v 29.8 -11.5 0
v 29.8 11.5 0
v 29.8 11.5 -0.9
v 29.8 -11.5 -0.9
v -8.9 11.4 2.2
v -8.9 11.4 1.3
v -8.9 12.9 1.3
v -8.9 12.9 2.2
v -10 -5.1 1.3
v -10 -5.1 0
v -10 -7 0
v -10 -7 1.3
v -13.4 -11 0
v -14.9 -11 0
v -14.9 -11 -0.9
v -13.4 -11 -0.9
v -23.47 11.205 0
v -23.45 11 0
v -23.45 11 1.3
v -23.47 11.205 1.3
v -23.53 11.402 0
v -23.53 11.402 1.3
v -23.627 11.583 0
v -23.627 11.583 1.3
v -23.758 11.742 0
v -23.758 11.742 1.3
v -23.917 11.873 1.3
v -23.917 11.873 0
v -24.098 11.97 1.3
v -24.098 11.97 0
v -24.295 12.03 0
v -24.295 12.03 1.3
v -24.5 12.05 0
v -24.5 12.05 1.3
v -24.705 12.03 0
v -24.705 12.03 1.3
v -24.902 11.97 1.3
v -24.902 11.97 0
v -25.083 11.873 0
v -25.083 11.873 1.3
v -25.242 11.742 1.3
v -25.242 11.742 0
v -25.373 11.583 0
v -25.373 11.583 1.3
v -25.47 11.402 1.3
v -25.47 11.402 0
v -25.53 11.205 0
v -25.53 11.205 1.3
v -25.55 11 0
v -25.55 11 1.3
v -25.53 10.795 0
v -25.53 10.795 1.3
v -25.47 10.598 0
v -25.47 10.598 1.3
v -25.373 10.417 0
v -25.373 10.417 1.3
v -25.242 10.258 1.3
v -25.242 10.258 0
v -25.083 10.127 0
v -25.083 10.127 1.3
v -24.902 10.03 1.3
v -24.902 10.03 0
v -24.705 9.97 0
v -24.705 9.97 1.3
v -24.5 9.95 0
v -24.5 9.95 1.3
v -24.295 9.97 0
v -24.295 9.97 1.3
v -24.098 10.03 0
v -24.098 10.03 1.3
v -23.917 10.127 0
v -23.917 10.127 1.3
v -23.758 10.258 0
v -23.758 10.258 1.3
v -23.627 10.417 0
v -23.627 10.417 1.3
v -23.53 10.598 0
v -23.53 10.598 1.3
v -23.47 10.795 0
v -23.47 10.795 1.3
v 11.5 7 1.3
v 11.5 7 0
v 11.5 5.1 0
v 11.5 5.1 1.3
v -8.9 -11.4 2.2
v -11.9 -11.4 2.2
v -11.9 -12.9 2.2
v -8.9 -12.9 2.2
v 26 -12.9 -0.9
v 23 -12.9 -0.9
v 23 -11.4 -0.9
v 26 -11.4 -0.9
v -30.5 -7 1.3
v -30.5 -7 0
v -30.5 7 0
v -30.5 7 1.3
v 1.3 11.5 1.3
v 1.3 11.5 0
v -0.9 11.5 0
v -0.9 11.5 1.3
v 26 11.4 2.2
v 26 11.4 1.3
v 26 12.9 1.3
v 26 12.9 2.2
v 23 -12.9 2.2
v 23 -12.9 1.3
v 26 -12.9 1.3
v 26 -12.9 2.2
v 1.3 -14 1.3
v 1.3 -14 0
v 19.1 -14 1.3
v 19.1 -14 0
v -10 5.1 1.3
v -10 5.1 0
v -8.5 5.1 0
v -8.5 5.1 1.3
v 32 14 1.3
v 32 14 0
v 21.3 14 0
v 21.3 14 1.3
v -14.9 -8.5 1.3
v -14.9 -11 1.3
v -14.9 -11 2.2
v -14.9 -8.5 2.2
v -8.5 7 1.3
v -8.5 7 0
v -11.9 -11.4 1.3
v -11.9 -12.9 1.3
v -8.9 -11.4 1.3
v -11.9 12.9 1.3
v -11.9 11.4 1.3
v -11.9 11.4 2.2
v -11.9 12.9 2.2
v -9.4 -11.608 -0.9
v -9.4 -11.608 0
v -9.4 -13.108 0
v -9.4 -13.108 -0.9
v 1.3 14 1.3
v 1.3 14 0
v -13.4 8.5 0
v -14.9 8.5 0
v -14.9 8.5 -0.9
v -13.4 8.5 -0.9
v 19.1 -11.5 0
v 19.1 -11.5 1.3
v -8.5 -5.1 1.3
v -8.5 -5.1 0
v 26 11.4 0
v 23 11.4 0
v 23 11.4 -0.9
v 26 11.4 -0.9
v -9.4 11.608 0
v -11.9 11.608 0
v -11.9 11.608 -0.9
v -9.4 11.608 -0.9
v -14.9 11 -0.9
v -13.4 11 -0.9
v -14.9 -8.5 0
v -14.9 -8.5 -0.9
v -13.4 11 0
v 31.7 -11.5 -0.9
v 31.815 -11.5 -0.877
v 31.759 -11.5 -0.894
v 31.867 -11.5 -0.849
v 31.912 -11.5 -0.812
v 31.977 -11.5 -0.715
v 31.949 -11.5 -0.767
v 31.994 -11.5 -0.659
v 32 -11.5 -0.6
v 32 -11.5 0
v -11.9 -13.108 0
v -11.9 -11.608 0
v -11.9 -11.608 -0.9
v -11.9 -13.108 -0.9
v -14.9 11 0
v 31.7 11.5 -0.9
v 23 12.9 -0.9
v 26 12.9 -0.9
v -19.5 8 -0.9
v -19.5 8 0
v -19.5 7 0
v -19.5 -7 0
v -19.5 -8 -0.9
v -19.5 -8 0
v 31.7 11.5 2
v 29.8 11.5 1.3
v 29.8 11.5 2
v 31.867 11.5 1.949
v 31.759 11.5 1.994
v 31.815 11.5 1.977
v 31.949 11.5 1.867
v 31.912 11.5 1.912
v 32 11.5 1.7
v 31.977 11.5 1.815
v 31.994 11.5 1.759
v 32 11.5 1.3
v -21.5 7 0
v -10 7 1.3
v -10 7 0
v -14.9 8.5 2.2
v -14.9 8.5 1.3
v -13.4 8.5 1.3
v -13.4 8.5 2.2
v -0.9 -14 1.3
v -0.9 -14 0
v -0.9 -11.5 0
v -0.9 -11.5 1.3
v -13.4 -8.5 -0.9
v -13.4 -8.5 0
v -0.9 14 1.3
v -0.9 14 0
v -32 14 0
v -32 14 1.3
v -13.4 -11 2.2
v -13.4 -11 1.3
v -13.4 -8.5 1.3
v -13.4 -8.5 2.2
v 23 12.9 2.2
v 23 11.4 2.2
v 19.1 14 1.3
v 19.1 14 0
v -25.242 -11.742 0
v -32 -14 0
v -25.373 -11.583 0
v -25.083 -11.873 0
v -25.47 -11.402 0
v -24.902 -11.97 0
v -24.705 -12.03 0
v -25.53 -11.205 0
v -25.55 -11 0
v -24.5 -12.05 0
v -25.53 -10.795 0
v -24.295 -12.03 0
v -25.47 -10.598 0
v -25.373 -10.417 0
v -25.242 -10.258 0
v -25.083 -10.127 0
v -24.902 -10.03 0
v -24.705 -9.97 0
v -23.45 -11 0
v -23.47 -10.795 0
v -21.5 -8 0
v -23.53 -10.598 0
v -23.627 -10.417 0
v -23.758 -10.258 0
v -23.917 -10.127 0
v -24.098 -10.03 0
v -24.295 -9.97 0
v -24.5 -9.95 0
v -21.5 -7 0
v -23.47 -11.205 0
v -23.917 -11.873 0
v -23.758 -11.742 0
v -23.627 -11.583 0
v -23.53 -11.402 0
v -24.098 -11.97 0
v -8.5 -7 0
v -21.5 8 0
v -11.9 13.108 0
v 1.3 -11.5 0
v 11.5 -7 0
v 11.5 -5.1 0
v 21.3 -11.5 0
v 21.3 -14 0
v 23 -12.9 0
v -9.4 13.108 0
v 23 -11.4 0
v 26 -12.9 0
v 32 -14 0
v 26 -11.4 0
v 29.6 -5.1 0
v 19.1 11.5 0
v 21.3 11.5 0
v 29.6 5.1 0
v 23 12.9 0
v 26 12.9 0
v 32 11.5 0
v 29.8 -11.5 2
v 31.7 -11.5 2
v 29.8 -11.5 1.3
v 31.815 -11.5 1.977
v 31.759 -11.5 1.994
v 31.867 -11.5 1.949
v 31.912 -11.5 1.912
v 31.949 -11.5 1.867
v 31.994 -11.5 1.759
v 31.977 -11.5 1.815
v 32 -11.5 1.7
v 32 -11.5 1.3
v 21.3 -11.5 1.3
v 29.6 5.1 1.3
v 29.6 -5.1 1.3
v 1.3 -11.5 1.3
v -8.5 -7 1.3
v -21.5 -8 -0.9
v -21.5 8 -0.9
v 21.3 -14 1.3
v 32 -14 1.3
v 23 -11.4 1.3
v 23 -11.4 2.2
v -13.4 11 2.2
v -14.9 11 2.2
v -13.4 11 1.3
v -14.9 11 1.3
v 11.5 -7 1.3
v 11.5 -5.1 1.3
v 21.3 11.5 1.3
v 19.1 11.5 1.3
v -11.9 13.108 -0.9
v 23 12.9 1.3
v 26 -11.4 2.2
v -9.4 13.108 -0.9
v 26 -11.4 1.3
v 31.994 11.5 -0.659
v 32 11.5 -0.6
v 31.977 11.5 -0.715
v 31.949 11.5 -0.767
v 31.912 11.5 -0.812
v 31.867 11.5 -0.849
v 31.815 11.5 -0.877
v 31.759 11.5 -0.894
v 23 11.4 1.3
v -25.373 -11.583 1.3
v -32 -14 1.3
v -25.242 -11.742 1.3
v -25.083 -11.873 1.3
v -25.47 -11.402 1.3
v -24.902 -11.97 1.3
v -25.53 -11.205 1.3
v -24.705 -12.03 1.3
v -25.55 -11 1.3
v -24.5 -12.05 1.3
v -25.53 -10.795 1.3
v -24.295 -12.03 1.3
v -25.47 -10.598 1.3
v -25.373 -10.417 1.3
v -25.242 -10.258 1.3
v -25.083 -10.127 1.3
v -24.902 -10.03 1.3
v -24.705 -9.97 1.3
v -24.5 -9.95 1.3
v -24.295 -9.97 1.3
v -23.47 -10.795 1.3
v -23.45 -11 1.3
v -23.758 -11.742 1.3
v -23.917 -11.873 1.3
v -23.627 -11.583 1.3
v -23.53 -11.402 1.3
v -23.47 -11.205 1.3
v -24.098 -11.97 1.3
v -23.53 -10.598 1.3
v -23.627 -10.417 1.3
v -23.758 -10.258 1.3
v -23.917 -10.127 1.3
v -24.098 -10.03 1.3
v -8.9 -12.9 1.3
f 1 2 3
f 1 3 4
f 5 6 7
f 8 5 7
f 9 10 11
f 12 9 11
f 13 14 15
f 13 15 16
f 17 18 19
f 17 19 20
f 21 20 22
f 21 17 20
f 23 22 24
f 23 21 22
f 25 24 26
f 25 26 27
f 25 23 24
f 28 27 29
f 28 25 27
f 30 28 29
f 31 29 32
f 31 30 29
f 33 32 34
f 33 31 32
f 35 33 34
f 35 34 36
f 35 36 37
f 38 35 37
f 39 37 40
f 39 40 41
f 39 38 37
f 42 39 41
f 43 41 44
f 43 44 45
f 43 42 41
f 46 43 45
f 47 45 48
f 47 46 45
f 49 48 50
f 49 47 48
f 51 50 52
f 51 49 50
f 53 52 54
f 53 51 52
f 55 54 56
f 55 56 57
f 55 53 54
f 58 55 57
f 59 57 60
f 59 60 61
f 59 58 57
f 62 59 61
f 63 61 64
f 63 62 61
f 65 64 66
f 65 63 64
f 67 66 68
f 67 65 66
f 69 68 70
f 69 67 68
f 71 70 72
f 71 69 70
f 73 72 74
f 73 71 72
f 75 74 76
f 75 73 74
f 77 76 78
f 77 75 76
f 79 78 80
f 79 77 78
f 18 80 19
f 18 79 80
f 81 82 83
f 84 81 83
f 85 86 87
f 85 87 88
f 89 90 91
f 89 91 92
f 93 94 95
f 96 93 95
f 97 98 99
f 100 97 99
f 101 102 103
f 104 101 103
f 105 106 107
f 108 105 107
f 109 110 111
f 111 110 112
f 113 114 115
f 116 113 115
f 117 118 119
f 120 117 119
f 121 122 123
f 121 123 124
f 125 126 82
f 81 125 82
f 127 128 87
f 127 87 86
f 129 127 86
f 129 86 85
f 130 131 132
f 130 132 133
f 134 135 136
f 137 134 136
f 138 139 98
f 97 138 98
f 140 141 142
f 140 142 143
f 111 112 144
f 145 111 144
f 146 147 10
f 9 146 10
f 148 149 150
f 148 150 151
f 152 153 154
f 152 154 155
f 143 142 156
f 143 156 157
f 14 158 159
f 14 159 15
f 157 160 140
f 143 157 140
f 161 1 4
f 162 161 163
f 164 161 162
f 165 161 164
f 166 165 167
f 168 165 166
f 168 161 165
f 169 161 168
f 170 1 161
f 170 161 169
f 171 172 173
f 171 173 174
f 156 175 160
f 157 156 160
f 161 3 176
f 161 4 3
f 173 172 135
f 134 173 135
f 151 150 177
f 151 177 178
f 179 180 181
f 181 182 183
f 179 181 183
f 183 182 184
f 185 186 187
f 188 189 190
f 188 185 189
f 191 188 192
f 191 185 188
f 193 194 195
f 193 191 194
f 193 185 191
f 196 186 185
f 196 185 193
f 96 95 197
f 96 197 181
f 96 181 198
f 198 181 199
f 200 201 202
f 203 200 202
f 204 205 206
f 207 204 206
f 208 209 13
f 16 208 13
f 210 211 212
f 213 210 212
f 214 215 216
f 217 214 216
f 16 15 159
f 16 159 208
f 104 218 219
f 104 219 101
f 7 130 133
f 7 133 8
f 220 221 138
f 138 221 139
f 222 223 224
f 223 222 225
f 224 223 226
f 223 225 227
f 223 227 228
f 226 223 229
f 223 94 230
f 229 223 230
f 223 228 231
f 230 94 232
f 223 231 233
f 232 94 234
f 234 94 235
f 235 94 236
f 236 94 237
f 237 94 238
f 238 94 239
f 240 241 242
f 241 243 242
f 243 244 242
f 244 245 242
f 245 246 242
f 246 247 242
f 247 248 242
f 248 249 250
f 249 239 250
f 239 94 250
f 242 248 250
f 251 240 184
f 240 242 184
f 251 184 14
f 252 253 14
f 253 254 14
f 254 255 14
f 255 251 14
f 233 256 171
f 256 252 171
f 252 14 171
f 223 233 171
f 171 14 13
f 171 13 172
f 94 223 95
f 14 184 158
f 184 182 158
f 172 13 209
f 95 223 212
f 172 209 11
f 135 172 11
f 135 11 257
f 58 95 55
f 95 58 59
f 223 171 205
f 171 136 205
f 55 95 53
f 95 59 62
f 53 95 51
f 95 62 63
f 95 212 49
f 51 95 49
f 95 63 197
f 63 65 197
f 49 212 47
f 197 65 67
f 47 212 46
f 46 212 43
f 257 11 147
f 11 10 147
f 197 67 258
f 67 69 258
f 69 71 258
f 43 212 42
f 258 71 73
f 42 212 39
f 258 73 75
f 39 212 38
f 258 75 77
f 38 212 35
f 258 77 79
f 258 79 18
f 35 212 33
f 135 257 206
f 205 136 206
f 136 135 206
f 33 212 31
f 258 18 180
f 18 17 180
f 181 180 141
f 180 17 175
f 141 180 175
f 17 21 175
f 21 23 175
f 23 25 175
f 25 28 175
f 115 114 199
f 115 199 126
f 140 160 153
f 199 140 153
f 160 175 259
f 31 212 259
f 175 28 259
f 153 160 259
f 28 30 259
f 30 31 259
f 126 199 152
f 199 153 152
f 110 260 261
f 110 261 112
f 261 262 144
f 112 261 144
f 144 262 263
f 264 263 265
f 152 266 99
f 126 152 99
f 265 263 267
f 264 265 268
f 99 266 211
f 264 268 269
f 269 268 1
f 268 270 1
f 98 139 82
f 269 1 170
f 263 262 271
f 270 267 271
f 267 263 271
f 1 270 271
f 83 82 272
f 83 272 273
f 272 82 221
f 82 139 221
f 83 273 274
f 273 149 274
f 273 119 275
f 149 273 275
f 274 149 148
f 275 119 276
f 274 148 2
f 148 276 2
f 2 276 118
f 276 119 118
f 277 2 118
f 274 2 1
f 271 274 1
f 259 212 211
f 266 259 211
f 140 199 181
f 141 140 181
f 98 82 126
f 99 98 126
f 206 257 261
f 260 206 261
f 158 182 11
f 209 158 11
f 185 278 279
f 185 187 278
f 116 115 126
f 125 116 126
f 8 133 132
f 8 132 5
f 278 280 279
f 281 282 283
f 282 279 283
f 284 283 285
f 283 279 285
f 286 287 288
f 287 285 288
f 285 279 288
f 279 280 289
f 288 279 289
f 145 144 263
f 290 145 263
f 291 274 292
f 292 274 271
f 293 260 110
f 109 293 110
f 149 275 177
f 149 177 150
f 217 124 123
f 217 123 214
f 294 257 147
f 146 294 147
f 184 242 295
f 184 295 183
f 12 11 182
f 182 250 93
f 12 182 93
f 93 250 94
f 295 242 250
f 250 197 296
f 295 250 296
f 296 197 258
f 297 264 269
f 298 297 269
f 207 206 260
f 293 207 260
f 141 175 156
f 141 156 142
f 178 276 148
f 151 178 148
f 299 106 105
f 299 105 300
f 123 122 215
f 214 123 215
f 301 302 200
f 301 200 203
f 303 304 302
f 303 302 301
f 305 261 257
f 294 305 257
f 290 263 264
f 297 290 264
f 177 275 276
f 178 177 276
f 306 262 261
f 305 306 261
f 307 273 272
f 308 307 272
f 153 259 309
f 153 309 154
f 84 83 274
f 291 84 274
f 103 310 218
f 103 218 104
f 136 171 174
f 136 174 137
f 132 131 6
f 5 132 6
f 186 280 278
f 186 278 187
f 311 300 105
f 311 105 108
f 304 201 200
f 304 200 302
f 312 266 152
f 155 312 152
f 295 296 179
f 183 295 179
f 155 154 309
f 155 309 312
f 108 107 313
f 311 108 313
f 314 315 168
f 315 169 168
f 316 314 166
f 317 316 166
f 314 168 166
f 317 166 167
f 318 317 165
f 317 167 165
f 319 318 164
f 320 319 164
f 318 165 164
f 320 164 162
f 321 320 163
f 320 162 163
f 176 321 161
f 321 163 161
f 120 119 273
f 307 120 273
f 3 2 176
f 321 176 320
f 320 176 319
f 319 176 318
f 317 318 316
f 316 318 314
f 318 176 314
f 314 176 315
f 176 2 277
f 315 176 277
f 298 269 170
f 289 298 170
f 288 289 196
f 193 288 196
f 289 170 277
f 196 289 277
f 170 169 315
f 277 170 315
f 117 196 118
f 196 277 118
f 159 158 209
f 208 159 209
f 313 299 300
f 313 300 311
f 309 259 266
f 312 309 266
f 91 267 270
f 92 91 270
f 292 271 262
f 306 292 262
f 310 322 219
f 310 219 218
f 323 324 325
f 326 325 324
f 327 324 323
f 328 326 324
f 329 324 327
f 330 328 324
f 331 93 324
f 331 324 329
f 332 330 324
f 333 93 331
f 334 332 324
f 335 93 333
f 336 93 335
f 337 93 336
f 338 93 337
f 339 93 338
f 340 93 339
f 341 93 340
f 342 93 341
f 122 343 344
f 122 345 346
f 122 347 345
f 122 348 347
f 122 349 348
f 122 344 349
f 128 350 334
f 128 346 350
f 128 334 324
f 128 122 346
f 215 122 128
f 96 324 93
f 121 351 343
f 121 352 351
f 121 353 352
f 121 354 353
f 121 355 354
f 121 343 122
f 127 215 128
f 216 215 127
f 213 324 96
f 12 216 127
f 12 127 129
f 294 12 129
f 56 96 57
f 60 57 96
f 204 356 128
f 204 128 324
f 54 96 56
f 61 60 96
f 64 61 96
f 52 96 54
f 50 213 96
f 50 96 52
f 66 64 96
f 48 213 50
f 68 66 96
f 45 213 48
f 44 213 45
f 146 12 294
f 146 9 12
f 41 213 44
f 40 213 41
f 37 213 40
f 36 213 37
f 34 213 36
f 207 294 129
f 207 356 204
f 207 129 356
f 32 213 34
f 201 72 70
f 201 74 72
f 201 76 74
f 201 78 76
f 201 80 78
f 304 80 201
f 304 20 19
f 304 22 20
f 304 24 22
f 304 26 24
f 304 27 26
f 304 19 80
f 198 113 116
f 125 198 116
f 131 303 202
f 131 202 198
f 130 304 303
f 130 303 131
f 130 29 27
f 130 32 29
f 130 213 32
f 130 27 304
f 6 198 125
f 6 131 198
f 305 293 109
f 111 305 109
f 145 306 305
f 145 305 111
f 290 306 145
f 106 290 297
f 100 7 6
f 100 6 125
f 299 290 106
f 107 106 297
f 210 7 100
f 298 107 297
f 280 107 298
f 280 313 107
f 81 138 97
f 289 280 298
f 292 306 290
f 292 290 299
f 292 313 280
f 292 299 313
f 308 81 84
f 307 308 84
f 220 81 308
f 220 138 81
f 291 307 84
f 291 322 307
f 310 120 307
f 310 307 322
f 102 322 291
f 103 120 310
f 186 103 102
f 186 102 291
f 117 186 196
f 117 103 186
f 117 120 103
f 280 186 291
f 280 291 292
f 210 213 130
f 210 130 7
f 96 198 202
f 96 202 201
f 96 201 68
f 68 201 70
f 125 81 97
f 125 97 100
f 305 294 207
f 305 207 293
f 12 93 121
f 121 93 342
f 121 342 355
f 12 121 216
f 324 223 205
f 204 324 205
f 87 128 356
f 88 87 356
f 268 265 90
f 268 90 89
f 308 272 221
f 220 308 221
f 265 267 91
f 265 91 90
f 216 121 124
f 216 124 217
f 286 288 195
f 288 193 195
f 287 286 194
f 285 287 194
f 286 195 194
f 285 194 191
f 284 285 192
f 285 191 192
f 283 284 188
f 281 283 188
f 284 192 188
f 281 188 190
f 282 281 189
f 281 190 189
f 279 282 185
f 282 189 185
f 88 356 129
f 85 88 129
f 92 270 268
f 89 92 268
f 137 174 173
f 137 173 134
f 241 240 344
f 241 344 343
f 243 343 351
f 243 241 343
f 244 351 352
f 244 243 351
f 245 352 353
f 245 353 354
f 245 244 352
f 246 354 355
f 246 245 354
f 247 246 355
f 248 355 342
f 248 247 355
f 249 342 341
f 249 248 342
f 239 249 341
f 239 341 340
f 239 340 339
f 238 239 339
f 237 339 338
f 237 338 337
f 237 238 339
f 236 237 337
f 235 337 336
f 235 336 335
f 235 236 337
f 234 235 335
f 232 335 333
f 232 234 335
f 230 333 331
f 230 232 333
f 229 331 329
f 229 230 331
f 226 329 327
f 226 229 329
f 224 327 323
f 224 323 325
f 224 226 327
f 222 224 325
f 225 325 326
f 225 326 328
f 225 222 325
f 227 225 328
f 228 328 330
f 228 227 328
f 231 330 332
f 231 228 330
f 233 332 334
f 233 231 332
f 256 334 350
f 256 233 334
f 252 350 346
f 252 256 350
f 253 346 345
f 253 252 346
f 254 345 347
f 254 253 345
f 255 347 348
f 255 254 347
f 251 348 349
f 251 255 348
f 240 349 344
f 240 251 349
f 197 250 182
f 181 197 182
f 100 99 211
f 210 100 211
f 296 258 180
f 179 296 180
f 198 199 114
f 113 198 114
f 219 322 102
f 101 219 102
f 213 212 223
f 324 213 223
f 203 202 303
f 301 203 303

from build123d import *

# Parameters (mm, degrees)
F0_R      = 1.05
F1_DEPTH  = 1.3
F3_W      = 2.2
F3_H      = 23
F4_DEPTH  = 0.7
F5_W      = 2.5
F5_H      = 1.5
F5_W_2    = 1.5
F5_H_2    = 2.5
F5_W_3    = 3
F5_W_4    = 2.2
F5_H_3    = 23
F6_DEPTH  = 0.9
F7_R      = 0.3
F8_R      = 0.3
F9_W      = 2
F9_H      = 1
F9_H_2    = 14
F10_DEPTH = 0.9
F3_W_2    = 3
F3_H_2    = 1.5
F3_W_3    = 1.5
F3_H_3    = 2.5
F11_DEPTH = 0.9


with BuildPart() as f1:
    # F0 (on Top) → F1 (new body)
    with BuildSketch(Plane.XY):
        Polygon((21.3, -14), (32, -14), (32, 14), (21.3, 14), (21.3, 11.5), (19.1, 11.5), (19.1, 14), (1.3, 14), (1.3, 11.5), (-0.9, 11.5), (-0.9, 14), (-32, 14), (-32, -14), (-0.9, -14), (-0.9, -11.5), (1.3, -11.5), (1.3, -14), (19.1, -14), (19.1, -11.5), (21.3, -11.5), align=None)
        with Locations((-24.5, -11)):
            Circle(F0_R, mode=Mode.SUBTRACT)
        Polygon((-10, 7), (-10, 5.1), (-8.5, 5.1), (-8.5, 7), (11.5, 7), (11.5, 5.1), (29.6, 5.1), (29.6, -5.1), (11.5, -5.1), (11.5, -7), (-8.5, -7), (-8.5, -5.1), (-10, -5.1), (-10, -7), (-30.5, -7), (-30.5, -5.1), (-30.5, 5.1), (-30.5, 7), align=None, mode=Mode.SUBTRACT)
        with Locations((-24.5, 11)):
            Circle(F0_R, mode=Mode.SUBTRACT)
    extrude(amount=F1_DEPTH)

    # F3 (on face) → F4 (join)
    with BuildSketch(Plane.XY.offset(1.3)):
        with Locations((30.9, 0)):
            Rectangle(F3_W, F3_H)
    extrude(amount=F4_DEPTH)

    # F5 (on face) → F6 (join)
    with BuildSketch(Plane(origin=(0, 0, 0), x_dir=(1, 0, 0), z_dir=(0, 0, -1))):
        with Locations((-10.65, 12.3576217964)):
            Rectangle(F5_W, F5_H)
        with Locations((-14.15, 9.75)):
            Rectangle(F5_W_2, F5_H_2)
        with Locations((-14.15, -9.75)):
            Rectangle(F5_W_2, F5_H_2)
        with Locations((-10.65, -12.3576217964)):
            Rectangle(F5_W, F5_H)
        with Locations((24.5, -12.15)):
            Rectangle(F5_W_3, F5_H)
        with Locations((30.9, 0)):
            Rectangle(F5_W_4, F5_H_3)
        with Locations((24.5, 12.15)):
            Rectangle(F5_W_3, F5_H)
    extrude(amount=F6_DEPTH)

    # F7
    f7_edges = [f1.edges().sort_by_distance(p)[0] for p in [
        (32, 0, -0.9),
    ]]
    fillet(f7_edges, radius=F7_R)

    # F8
    f8_edges = [f1.edges().sort_by_distance(p)[0] for p in [
        (32, 0, 2),
    ]]
    fillet(f8_edges, radius=F8_R)

    # F9 (on face) → F10 (join)
    with BuildSketch(Plane(origin=(0, 0, 0), x_dir=(1, 0, 0), z_dir=(0, 0, -1))):
        with Locations((-20.5, 7.5)):
            Rectangle(F9_W, F9_H)
        with Locations((-20.5, -7.5)):
            Rectangle(F9_W, F9_H)
        with Locations((-20.5, 0)):
            Rectangle(F9_W, F9_H_2)
    extrude(amount=F10_DEPTH)

    # F3 (on face) → F11 (join)
    with BuildSketch(Plane.XY.offset(1.3)):
        with Locations((-10.4, 12.15)):
            Rectangle(F3_W_2, F3_H_2)
        with Locations((-14.15, 9.75)):
            Rectangle(F3_W_3, F3_H_3)
        with Locations((-14.15, -9.75)):
            Rectangle(F3_W_3, F3_H_3)
        with Locations((-10.4, -12.15)):
            Rectangle(F3_W_2, F3_H_2)
        with Locations((24.5, -12.15)):
            Rectangle(F3_W_2, F3_H_2)
        with Locations((24.5, 12.15)):
            Rectangle(F3_W_2, F3_H_2)
    extrude(amount=F11_DEPTH)


solid = f1.part
